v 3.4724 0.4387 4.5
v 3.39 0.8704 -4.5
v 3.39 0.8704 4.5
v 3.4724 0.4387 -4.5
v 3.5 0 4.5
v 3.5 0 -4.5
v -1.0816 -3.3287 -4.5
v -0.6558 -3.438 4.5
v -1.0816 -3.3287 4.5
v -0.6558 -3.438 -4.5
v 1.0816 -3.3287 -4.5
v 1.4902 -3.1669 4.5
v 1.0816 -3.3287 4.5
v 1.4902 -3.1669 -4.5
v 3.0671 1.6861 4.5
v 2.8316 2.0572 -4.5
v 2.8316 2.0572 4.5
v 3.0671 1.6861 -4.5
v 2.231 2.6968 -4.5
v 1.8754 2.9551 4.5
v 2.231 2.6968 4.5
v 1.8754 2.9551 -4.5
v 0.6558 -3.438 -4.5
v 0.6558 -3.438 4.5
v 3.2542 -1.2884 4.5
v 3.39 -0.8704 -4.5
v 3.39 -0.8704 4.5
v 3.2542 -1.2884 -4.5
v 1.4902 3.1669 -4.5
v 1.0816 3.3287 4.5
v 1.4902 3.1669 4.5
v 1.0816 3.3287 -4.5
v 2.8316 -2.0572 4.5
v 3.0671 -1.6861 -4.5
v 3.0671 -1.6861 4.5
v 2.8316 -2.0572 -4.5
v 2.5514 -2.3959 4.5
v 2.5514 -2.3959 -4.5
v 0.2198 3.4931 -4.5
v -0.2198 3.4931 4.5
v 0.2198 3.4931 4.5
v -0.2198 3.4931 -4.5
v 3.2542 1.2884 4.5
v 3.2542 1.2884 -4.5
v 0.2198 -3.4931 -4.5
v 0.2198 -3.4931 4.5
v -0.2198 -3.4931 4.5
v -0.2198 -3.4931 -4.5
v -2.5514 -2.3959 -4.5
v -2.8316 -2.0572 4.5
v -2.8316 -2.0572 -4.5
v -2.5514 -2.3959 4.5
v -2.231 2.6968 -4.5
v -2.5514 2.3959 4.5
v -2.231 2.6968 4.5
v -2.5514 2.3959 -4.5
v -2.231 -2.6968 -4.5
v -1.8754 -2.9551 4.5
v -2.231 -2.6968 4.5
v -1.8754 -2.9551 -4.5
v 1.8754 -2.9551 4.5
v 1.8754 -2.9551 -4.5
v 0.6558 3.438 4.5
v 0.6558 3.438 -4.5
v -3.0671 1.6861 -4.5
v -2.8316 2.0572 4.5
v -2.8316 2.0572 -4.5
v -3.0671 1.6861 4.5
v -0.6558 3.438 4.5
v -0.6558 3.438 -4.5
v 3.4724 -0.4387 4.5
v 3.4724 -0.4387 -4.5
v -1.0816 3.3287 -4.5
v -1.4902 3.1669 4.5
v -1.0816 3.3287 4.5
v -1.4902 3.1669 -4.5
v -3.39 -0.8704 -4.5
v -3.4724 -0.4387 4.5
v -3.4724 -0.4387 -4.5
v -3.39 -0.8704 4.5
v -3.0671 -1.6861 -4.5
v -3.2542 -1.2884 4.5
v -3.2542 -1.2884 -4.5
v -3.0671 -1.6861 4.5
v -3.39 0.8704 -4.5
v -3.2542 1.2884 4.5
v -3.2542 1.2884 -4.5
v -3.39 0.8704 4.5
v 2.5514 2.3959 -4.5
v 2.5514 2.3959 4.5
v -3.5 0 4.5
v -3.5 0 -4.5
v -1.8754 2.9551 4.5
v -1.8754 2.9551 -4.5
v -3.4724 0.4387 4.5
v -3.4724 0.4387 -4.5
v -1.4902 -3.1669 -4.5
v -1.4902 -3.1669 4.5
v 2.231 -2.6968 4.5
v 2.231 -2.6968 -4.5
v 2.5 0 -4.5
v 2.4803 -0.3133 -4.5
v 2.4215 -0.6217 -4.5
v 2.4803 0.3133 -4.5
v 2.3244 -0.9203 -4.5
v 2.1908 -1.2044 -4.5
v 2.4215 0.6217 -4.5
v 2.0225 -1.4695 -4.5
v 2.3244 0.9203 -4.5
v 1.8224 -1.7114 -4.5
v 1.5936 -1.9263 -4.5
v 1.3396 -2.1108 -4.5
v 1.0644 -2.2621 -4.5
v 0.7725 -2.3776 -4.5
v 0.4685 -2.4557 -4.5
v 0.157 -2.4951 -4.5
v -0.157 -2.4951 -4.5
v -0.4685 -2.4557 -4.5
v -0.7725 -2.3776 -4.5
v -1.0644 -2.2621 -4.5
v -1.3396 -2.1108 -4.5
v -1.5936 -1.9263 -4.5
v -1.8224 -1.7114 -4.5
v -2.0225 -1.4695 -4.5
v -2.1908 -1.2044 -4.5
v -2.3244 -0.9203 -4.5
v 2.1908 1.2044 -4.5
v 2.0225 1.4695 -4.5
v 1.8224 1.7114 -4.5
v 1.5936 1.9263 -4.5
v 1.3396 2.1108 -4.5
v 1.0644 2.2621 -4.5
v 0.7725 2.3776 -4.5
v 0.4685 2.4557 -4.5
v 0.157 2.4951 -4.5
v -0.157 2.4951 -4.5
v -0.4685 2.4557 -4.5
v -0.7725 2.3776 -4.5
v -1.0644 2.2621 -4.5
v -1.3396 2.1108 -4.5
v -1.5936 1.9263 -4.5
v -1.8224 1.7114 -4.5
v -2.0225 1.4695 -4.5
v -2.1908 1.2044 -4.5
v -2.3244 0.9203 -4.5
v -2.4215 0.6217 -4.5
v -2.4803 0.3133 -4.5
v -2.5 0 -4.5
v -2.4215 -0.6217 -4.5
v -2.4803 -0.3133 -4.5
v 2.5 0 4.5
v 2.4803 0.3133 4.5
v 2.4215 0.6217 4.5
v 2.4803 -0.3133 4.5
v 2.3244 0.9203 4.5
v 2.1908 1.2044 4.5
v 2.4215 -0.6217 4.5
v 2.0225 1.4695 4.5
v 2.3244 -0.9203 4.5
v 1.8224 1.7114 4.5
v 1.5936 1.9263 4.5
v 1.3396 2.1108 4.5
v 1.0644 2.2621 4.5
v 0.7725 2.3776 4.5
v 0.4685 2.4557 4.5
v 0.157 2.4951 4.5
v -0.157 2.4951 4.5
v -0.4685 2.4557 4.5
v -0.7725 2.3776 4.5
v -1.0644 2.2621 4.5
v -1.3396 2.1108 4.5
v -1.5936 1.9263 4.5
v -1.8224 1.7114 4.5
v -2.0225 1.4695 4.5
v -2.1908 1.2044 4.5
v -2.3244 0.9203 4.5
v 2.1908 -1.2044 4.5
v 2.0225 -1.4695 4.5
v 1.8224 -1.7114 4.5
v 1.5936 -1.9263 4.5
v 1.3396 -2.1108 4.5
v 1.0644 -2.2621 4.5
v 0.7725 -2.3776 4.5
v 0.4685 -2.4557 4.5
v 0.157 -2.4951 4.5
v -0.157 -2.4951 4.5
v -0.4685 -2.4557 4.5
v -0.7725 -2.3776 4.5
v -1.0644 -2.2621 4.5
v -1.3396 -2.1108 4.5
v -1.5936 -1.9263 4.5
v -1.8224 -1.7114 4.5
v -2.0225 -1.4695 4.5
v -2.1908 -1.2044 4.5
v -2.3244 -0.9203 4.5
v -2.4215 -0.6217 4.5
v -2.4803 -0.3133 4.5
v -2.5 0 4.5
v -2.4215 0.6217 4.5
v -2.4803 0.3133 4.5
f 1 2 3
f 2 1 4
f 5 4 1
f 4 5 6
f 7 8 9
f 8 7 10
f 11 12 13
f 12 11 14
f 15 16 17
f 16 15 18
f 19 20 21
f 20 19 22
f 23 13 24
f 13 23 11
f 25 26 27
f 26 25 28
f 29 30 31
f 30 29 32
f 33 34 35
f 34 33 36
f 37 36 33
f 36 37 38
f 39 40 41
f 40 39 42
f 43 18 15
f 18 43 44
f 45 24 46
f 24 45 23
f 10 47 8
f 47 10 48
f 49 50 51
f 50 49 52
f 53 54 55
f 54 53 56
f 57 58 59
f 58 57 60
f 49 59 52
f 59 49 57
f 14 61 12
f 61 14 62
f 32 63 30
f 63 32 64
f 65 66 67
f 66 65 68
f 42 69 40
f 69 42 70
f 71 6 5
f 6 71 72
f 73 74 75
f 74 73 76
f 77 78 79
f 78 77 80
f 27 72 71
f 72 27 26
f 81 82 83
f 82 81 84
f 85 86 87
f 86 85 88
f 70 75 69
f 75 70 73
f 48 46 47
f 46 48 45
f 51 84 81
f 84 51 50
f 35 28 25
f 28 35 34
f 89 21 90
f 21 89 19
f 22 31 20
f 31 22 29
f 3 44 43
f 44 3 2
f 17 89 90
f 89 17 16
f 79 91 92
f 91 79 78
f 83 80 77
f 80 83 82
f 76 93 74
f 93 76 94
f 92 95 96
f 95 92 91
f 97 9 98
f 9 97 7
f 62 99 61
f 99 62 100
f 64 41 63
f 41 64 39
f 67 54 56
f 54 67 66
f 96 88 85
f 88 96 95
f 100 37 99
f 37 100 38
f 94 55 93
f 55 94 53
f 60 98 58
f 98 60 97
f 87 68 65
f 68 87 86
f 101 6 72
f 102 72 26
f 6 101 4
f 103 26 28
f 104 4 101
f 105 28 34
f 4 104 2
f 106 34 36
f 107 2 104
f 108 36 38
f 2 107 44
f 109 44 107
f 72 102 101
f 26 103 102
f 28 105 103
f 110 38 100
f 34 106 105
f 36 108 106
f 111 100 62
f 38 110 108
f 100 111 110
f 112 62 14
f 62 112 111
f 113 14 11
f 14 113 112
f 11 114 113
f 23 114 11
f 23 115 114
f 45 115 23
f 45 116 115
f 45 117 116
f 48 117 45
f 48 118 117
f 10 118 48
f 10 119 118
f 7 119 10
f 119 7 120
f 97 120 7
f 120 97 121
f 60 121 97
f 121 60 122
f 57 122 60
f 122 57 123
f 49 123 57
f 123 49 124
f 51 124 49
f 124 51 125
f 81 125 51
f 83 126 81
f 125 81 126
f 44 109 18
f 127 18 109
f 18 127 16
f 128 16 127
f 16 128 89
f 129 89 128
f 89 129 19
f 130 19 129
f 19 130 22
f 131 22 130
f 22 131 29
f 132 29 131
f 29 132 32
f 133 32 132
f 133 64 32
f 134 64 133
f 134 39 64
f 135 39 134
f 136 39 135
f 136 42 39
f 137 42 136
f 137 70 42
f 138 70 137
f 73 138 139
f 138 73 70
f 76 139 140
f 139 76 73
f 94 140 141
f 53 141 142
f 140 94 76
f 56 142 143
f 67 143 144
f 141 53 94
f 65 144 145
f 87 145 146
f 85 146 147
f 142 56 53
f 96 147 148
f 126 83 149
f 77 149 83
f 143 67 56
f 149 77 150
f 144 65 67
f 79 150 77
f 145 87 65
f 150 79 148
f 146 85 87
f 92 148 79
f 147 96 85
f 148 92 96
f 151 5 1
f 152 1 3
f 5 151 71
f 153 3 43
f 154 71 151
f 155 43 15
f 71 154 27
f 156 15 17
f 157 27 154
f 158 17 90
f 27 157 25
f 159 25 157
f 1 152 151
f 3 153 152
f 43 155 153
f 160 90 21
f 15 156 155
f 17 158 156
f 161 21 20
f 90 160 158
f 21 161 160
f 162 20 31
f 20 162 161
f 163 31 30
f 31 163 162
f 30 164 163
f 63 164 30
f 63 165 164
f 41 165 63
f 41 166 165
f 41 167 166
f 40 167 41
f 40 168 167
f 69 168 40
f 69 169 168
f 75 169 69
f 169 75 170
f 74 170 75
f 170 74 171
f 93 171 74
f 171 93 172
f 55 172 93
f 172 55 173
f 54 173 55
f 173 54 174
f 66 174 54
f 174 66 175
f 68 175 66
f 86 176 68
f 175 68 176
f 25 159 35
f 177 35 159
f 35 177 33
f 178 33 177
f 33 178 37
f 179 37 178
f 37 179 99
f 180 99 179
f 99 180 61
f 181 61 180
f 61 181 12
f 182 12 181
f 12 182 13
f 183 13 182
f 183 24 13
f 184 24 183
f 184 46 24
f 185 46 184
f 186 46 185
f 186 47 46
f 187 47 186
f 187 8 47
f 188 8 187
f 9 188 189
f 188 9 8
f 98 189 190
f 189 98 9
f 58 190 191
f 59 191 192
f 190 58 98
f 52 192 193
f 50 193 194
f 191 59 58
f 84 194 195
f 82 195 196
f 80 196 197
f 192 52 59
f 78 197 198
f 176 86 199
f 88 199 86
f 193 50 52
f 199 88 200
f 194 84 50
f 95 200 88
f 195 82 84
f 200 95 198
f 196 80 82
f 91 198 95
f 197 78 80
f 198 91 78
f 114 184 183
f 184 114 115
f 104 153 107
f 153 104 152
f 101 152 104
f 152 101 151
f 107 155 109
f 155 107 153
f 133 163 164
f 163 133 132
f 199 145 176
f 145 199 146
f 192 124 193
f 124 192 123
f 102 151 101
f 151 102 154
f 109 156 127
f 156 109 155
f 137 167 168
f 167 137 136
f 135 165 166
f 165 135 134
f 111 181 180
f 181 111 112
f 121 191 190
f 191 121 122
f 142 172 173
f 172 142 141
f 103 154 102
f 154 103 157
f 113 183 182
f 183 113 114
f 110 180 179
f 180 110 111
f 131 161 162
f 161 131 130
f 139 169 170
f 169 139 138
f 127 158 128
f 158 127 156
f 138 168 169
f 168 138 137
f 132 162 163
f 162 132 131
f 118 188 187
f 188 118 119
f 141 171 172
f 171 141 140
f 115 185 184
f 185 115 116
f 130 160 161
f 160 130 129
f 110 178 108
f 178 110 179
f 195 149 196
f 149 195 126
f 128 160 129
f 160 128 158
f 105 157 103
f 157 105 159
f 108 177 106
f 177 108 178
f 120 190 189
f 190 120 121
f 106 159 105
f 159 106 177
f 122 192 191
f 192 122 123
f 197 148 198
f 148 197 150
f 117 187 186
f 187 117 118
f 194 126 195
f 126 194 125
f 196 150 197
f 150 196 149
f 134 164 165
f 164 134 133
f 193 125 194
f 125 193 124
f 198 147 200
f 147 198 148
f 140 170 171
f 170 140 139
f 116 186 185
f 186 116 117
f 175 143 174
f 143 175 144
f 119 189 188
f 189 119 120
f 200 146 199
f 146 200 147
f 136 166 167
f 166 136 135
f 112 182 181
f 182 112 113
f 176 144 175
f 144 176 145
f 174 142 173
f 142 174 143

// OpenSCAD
$fn = 50;


difference() {
	union() {
		translate(v = [0, 0, -4.5000000000]) {
			cylinder(h = 9, r = 3.5000000000);
		}
	}
	union() {
		translate(v = [0, 0, -100.0000000000]) {
			cylinder(h = 200, r = 2.5000000000);
		}
	}
}
